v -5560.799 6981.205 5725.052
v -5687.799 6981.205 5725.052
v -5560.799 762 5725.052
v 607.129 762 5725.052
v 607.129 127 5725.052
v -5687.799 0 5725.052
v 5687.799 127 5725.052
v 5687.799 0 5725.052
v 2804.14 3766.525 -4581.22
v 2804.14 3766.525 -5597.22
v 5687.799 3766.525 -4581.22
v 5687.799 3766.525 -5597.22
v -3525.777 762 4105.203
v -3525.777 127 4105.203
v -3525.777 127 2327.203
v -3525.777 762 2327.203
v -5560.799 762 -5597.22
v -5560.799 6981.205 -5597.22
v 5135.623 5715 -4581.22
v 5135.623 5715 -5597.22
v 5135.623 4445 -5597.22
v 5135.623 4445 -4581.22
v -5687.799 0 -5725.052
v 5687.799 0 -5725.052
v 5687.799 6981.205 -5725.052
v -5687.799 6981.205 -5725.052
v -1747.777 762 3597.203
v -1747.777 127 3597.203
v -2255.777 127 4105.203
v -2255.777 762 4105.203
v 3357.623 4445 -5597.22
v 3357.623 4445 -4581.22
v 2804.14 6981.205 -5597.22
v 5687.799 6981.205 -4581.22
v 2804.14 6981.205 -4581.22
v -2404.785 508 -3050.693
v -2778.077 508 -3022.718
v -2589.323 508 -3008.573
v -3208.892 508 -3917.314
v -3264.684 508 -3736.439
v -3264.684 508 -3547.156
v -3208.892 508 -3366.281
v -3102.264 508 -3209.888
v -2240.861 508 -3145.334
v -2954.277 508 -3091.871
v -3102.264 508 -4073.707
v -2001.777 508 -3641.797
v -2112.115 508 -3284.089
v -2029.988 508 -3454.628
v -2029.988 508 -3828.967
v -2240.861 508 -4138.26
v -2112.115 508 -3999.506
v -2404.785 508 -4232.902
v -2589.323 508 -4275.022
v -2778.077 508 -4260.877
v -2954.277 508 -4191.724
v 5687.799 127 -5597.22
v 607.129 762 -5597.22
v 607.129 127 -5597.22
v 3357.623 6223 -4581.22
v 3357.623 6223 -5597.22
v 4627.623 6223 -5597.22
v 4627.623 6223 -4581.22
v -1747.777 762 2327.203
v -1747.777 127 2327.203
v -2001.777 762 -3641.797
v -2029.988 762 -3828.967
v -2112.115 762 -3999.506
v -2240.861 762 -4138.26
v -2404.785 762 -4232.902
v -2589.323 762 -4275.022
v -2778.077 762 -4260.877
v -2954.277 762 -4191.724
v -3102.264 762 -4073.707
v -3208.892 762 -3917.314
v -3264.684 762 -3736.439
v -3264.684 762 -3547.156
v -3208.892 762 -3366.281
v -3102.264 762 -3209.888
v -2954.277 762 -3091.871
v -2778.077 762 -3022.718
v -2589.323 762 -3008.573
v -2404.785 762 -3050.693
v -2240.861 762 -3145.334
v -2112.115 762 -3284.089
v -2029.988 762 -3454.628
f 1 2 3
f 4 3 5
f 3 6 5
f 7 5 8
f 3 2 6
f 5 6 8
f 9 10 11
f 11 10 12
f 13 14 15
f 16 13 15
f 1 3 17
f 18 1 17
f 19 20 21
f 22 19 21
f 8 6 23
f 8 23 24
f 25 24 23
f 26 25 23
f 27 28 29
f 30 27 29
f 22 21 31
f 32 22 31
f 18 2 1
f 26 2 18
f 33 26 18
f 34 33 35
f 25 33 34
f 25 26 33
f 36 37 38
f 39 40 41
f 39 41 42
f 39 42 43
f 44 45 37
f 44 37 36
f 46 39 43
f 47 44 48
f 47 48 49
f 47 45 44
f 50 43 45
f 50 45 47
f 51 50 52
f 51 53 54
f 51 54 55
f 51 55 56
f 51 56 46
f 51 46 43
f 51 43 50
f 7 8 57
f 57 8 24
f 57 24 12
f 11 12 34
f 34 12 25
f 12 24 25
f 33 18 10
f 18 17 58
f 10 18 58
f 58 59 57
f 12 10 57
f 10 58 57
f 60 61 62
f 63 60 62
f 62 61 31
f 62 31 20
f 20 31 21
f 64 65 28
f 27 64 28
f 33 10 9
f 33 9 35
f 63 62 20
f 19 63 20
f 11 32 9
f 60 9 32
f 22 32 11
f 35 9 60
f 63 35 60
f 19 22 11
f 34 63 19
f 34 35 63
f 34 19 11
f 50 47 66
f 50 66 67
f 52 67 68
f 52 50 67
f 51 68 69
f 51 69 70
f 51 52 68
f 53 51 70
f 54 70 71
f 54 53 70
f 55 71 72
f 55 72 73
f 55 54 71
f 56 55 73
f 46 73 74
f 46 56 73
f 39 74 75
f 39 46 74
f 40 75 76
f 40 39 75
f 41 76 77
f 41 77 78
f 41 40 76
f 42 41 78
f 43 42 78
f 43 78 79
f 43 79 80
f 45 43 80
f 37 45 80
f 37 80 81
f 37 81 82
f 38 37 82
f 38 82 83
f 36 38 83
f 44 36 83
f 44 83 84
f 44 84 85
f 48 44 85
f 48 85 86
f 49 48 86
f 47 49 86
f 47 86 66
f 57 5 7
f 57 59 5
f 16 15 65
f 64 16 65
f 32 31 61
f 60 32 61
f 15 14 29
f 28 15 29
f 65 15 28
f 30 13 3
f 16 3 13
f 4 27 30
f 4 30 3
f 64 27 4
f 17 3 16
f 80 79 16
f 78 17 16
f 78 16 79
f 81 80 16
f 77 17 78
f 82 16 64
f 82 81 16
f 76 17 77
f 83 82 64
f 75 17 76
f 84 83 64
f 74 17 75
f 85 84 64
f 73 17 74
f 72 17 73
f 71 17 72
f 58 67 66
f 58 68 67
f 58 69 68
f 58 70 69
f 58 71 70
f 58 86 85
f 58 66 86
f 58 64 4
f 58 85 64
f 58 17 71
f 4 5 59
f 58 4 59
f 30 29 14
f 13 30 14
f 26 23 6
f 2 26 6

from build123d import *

# Parameters (mm, degrees)
SKETCH1_W           = 5080.67056
SKETCH1_H           = 11322.27229855
SKETCH1_W_2         = 6167.92772
SKETCH1_R           = 635
SKETCH1_H_2         = 127.83180145
BOSS_EXTRUDE1_DEPTH = 127
SKETCH1_3_W         = 6167.92772
SKETCH1_3_H         = 11322.27229855
SKETCH1_3_R         = 635
SKETCH1_3_W_2       = 5080.67056
SKETCH1_3_H_2       = 127.83180145
BOSS_EXTRUDE2_DEPTH = 762
SKETCH1_4_W         = 5080.67056
SKETCH1_4_H         = 127.83180145
BOSS_EXTRUDE3_DEPTH = 6981.20524
SKETCH1_6_R         = 635
BOSS_EXTRUDE5_DEPTH = 508
SKETCH2_W           = 2883.65946
SKETCH2_H           = 3214.67988
BOSS_EXTRUDE6_DEPTH = 1016


with BuildPart() as part:
    # Sketch1 → Boss-Extrude1 (new body)
    with BuildSketch(Plane(origin=(0, 0, 0), x_dir=(1, 0, 0), z_dir=(0, 1, 0))):
        with Locations((3147.46386, -63.915900725)):
            Rectangle(SKETCH1_W, SKETCH1_H)
        with Locations((-2476.83528, -63.915900725)):
            Rectangle(SKETCH1_W_2, SKETCH1_H)
        Polygon((-1747.77654, -2327.20261), (-1747.77654, -3597.20261), (-2255.77654, -4105.20261), (-3525.77654, -4105.20261), (-3525.77654, -2327.20261), align=None, mode=Mode.SUBTRACT)
        with Locations((-2636.77654, 3641.79739)):
            Circle(SKETCH1_R, mode=Mode.SUBTRACT)
        Polygon((607.12858, 5597.22024855), (607.12858, 5725.05205), (-5687.79914, 5725.05205), (-5687.79914, -5725.05205), (-5560.79914, -5725.05205), (-5560.79914, 5597.22024855), align=None)
        with Locations((3147.46386, 5661.136149275)):
            Rectangle(SKETCH1_W, SKETCH1_H_2)
        Polygon((-1747.77654, -2327.20261), (-1747.77654, -3597.20261), (-2255.77654, -4105.20261), (-3525.77654, -4105.20261), (-3525.77654, -2327.20261), align=None)
        with Locations((-2636.77654, 3641.79739)):
            Circle(SKETCH1_R)
    extrude(amount=BOSS_EXTRUDE1_DEPTH)

    # Sketch1<3> → Boss-Extrude2 (add)
    with BuildSketch(Plane(origin=(0, 0, 0), x_dir=(1, 0, 0), z_dir=(0, 1, 0))):
        with Locations((-2476.83528, -63.915900725)):
            Rectangle(SKETCH1_3_W, SKETCH1_3_H)
        Polygon((-1747.77654, -2327.20261), (-1747.77654, -3597.20261), (-2255.77654, -4105.20261), (-3525.77654, -4105.20261), (-3525.77654, -2327.20261), align=None, mode=Mode.SUBTRACT)
        with Locations((-2636.77654, 3641.79739)):
            Circle(SKETCH1_3_R, mode=Mode.SUBTRACT)
        Polygon((607.12858, 5597.22024855), (607.12858, 5725.05205), (-5687.79914, 5725.05205), (-5687.79914, -5725.05205), (-5560.79914, -5725.05205), (-5560.79914, 5597.22024855), align=None)
        with Locations((3147.46386, 5661.136149275)):
            Rectangle(SKETCH1_3_W_2, SKETCH1_3_H_2)
    extrude(amount=BOSS_EXTRUDE2_DEPTH)

    # Sketch1<4> → Boss-Extrude3 (add)
    with BuildSketch(Plane(origin=(0, 0, 0), x_dir=(1, 0, 0), z_dir=(0, 1, 0))):
        with Locations((3147.46386, 5661.136149275)):
            Rectangle(SKETCH1_4_W, SKETCH1_4_H)
        Polygon((607.12858, 5597.22024855), (607.12858, 5725.05205), (-5687.79914, 5725.05205), (-5687.79914, -5725.05205), (-5560.79914, -5725.05205), (-5560.79914, 5597.22024855), align=None)
    extrude(amount=BOSS_EXTRUDE3_DEPTH)

    # Sketch1<6> → Boss-Extrude5 (add)
    with BuildSketch(Plane(origin=(0, 0, 0), x_dir=(1, 0, 0), z_dir=(0, 1, 0))):
        with Locations((-2636.77654, 3641.79739)):
            Circle(SKETCH1_6_R)
    extrude(amount=BOSS_EXTRUDE5_DEPTH)

    # Sketch2 → Boss-Extrude6 (add)
    with BuildSketch(Plane.XY.offset(-5597.22024855)):
        with Locations((4245.96941, 5373.8653)):
            Rectangle(SKETCH2_W, SKETCH2_H)
        Polygon((4627.62346, 6223), (5135.62346, 5715), (5135.62346, 4445), (3357.62346, 4445), (3357.62346, 6223), align=None, mode=Mode.SUBTRACT)
    extrude(amount=BOSS_EXTRUDE6_DEPTH)


solid = part.part
